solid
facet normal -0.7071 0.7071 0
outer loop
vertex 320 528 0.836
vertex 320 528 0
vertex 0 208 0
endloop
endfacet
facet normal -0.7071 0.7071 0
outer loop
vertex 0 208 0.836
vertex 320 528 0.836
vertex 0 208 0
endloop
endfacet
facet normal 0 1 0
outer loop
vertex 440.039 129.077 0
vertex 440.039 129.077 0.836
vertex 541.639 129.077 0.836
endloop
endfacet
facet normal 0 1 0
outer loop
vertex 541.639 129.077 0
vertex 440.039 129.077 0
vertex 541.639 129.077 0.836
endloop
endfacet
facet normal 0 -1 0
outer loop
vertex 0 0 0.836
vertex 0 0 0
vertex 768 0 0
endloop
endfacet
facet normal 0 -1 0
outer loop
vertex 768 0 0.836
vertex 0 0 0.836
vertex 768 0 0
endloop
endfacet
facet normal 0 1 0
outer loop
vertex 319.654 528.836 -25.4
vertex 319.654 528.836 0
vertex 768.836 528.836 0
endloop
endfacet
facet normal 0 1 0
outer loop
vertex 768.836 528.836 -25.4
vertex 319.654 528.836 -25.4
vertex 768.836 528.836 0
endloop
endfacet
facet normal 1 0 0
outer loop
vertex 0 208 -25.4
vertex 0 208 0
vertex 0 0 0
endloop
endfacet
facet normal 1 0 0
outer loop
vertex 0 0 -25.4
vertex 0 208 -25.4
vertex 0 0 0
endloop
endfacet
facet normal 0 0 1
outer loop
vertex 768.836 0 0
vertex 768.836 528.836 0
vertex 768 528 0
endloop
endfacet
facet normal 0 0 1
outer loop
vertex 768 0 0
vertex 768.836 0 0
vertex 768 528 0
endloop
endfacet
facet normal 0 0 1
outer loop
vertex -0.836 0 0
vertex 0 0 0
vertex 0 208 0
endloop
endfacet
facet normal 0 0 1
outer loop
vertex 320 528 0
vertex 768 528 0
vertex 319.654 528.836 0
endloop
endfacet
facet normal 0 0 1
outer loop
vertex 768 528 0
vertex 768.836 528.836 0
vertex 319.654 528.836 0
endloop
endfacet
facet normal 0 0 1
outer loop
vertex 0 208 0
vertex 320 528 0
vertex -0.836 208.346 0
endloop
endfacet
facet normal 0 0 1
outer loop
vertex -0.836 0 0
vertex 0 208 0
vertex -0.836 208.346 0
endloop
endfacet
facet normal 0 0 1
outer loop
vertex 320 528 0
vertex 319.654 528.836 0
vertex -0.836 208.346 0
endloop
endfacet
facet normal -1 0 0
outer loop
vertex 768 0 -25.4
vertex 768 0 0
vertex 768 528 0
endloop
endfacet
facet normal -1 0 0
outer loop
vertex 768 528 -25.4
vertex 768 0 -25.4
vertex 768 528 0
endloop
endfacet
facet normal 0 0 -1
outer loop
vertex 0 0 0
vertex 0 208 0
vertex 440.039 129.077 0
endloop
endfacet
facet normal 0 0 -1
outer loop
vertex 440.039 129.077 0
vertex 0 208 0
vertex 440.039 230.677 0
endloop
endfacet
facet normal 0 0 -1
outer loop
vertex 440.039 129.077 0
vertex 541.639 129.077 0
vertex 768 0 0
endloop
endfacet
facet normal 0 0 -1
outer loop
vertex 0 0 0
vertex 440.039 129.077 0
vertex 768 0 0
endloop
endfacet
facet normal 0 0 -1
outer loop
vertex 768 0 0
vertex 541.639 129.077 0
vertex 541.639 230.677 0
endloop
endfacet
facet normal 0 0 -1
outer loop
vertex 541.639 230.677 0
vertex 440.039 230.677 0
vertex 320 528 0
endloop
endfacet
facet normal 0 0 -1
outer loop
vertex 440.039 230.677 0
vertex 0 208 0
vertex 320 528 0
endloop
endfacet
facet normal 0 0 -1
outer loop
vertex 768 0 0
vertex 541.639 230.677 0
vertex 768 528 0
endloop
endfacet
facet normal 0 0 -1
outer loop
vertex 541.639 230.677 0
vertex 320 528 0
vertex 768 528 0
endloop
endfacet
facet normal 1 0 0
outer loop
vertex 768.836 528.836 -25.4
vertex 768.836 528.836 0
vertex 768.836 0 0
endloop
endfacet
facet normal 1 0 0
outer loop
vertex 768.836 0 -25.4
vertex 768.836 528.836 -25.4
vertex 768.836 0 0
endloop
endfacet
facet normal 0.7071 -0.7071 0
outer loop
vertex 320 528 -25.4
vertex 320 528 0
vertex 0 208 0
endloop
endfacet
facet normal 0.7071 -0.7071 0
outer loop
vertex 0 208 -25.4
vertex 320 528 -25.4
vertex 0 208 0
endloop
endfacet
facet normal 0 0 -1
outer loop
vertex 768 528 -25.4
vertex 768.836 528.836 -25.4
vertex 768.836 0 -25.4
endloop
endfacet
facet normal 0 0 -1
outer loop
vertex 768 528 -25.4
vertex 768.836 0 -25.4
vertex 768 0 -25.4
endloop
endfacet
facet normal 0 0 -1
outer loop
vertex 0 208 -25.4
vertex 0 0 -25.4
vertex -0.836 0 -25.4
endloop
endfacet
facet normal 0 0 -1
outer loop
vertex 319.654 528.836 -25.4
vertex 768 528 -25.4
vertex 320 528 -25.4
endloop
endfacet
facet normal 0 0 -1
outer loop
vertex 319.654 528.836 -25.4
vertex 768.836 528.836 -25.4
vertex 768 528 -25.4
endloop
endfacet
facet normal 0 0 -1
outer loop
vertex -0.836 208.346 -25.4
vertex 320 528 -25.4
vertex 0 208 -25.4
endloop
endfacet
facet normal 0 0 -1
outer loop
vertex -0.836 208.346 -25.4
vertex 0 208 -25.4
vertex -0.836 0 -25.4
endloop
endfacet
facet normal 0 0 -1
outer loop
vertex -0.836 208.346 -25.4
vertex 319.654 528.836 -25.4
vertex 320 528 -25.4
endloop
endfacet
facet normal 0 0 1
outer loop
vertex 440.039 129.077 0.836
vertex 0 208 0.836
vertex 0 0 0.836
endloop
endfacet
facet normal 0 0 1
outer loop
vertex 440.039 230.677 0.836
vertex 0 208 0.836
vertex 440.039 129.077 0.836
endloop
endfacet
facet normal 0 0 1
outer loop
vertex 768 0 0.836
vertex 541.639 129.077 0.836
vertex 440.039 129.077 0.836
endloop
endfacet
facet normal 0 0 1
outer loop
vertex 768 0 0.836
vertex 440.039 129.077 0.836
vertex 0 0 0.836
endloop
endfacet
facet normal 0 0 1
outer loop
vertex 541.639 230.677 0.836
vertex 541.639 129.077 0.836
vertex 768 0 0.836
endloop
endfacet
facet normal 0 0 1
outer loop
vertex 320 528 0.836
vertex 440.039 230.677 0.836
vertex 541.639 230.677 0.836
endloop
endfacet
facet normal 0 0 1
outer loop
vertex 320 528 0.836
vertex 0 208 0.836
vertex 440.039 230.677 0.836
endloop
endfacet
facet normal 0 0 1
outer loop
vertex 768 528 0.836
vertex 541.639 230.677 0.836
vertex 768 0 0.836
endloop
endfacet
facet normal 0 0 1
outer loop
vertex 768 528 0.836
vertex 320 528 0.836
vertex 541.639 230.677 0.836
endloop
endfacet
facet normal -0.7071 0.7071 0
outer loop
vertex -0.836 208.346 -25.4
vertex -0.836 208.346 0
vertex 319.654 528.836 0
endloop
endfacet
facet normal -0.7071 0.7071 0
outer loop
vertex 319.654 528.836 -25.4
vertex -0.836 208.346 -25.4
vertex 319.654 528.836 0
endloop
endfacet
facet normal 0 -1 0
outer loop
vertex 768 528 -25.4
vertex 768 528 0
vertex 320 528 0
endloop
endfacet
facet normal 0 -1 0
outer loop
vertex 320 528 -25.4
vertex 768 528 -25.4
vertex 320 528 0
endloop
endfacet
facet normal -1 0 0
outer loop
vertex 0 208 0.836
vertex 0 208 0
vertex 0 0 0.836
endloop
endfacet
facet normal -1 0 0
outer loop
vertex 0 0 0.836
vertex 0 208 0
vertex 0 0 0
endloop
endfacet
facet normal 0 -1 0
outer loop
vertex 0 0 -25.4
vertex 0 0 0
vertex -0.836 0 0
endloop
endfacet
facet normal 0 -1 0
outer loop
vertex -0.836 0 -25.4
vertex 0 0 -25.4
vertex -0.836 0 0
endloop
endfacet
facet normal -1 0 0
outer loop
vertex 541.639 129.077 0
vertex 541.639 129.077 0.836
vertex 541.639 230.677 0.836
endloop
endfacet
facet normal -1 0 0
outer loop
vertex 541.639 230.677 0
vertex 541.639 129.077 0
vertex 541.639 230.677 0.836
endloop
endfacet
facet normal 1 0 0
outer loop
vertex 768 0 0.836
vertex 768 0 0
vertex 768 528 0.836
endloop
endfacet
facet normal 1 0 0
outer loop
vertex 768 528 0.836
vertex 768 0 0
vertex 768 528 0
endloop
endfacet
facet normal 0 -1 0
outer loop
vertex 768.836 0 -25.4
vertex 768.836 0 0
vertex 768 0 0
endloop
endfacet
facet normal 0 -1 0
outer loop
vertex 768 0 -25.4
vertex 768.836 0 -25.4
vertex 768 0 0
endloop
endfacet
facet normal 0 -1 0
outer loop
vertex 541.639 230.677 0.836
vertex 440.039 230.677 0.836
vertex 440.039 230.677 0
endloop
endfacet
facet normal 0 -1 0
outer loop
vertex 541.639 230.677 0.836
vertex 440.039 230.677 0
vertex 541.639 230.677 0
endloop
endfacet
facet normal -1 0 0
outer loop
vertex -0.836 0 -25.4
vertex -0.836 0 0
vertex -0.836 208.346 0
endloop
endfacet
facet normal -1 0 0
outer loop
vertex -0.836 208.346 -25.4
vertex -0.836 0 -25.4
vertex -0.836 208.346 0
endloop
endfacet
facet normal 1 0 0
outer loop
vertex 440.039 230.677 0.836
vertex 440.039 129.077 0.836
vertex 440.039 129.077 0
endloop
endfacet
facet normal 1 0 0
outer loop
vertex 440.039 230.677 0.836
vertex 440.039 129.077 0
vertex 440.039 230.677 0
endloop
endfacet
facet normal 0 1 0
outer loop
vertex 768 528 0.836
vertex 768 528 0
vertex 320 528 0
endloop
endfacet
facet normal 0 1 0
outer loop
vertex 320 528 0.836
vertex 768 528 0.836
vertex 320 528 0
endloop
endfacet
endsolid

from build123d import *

# Parameters (mm, degrees)
SALIENTE_EXTRUIR1_DEPTH = 0.83566
CROQUIS2_W              = 101.6
CROQUIS2_H              = 101.6
CORTAR_EXTRUIR1_DEPTH   = 454.83566
SALIENTE_EXTRUIR2_DEPTH = 25.4


with BuildPart() as part:
    # Croquis1 → Saliente-Extruir1 (new body)
    with BuildSketch(Plane.XY):
        Polygon((0, 0), (768, 0), (768, 528), (320, 528), (0, 208), align=None)
    extrude(amount=SALIENTE_EXTRUIR1_DEPTH)

    # Croquis2 → Cortar-Extruir1 (cut)
    with BuildSketch(Plane.XY.offset(0.83566)):
        with Locations((490.839276622, 179.877007982)):
            Rectangle(CROQUIS2_W, CROQUIS2_H)
    extrude(amount=-CORTAR_EXTRUIR1_DEPTH, mode=Mode.SUBTRACT)


with BuildPart() as body_2:
    # Croquis3 → Saliente-Extruir2 (new body)
    with BuildSketch(Plane(origin=(0, 0, 0), x_dir=(-1, 0, 0), z_dir=(0, 0, -1))):
        Polygon((0.83566, 0), (0.83566, 208.346141706), (-319.653858294, 528.83566), (-768.83566, 528.83566), (-768.83566, 0), (-768, 0), (-768, 528), (-320, 528), (0, 208), (0, 0), align=None)
    extrude(amount=SALIENTE_EXTRUIR2_DEPTH)


solid = Compound([part.part, body_2.part])
